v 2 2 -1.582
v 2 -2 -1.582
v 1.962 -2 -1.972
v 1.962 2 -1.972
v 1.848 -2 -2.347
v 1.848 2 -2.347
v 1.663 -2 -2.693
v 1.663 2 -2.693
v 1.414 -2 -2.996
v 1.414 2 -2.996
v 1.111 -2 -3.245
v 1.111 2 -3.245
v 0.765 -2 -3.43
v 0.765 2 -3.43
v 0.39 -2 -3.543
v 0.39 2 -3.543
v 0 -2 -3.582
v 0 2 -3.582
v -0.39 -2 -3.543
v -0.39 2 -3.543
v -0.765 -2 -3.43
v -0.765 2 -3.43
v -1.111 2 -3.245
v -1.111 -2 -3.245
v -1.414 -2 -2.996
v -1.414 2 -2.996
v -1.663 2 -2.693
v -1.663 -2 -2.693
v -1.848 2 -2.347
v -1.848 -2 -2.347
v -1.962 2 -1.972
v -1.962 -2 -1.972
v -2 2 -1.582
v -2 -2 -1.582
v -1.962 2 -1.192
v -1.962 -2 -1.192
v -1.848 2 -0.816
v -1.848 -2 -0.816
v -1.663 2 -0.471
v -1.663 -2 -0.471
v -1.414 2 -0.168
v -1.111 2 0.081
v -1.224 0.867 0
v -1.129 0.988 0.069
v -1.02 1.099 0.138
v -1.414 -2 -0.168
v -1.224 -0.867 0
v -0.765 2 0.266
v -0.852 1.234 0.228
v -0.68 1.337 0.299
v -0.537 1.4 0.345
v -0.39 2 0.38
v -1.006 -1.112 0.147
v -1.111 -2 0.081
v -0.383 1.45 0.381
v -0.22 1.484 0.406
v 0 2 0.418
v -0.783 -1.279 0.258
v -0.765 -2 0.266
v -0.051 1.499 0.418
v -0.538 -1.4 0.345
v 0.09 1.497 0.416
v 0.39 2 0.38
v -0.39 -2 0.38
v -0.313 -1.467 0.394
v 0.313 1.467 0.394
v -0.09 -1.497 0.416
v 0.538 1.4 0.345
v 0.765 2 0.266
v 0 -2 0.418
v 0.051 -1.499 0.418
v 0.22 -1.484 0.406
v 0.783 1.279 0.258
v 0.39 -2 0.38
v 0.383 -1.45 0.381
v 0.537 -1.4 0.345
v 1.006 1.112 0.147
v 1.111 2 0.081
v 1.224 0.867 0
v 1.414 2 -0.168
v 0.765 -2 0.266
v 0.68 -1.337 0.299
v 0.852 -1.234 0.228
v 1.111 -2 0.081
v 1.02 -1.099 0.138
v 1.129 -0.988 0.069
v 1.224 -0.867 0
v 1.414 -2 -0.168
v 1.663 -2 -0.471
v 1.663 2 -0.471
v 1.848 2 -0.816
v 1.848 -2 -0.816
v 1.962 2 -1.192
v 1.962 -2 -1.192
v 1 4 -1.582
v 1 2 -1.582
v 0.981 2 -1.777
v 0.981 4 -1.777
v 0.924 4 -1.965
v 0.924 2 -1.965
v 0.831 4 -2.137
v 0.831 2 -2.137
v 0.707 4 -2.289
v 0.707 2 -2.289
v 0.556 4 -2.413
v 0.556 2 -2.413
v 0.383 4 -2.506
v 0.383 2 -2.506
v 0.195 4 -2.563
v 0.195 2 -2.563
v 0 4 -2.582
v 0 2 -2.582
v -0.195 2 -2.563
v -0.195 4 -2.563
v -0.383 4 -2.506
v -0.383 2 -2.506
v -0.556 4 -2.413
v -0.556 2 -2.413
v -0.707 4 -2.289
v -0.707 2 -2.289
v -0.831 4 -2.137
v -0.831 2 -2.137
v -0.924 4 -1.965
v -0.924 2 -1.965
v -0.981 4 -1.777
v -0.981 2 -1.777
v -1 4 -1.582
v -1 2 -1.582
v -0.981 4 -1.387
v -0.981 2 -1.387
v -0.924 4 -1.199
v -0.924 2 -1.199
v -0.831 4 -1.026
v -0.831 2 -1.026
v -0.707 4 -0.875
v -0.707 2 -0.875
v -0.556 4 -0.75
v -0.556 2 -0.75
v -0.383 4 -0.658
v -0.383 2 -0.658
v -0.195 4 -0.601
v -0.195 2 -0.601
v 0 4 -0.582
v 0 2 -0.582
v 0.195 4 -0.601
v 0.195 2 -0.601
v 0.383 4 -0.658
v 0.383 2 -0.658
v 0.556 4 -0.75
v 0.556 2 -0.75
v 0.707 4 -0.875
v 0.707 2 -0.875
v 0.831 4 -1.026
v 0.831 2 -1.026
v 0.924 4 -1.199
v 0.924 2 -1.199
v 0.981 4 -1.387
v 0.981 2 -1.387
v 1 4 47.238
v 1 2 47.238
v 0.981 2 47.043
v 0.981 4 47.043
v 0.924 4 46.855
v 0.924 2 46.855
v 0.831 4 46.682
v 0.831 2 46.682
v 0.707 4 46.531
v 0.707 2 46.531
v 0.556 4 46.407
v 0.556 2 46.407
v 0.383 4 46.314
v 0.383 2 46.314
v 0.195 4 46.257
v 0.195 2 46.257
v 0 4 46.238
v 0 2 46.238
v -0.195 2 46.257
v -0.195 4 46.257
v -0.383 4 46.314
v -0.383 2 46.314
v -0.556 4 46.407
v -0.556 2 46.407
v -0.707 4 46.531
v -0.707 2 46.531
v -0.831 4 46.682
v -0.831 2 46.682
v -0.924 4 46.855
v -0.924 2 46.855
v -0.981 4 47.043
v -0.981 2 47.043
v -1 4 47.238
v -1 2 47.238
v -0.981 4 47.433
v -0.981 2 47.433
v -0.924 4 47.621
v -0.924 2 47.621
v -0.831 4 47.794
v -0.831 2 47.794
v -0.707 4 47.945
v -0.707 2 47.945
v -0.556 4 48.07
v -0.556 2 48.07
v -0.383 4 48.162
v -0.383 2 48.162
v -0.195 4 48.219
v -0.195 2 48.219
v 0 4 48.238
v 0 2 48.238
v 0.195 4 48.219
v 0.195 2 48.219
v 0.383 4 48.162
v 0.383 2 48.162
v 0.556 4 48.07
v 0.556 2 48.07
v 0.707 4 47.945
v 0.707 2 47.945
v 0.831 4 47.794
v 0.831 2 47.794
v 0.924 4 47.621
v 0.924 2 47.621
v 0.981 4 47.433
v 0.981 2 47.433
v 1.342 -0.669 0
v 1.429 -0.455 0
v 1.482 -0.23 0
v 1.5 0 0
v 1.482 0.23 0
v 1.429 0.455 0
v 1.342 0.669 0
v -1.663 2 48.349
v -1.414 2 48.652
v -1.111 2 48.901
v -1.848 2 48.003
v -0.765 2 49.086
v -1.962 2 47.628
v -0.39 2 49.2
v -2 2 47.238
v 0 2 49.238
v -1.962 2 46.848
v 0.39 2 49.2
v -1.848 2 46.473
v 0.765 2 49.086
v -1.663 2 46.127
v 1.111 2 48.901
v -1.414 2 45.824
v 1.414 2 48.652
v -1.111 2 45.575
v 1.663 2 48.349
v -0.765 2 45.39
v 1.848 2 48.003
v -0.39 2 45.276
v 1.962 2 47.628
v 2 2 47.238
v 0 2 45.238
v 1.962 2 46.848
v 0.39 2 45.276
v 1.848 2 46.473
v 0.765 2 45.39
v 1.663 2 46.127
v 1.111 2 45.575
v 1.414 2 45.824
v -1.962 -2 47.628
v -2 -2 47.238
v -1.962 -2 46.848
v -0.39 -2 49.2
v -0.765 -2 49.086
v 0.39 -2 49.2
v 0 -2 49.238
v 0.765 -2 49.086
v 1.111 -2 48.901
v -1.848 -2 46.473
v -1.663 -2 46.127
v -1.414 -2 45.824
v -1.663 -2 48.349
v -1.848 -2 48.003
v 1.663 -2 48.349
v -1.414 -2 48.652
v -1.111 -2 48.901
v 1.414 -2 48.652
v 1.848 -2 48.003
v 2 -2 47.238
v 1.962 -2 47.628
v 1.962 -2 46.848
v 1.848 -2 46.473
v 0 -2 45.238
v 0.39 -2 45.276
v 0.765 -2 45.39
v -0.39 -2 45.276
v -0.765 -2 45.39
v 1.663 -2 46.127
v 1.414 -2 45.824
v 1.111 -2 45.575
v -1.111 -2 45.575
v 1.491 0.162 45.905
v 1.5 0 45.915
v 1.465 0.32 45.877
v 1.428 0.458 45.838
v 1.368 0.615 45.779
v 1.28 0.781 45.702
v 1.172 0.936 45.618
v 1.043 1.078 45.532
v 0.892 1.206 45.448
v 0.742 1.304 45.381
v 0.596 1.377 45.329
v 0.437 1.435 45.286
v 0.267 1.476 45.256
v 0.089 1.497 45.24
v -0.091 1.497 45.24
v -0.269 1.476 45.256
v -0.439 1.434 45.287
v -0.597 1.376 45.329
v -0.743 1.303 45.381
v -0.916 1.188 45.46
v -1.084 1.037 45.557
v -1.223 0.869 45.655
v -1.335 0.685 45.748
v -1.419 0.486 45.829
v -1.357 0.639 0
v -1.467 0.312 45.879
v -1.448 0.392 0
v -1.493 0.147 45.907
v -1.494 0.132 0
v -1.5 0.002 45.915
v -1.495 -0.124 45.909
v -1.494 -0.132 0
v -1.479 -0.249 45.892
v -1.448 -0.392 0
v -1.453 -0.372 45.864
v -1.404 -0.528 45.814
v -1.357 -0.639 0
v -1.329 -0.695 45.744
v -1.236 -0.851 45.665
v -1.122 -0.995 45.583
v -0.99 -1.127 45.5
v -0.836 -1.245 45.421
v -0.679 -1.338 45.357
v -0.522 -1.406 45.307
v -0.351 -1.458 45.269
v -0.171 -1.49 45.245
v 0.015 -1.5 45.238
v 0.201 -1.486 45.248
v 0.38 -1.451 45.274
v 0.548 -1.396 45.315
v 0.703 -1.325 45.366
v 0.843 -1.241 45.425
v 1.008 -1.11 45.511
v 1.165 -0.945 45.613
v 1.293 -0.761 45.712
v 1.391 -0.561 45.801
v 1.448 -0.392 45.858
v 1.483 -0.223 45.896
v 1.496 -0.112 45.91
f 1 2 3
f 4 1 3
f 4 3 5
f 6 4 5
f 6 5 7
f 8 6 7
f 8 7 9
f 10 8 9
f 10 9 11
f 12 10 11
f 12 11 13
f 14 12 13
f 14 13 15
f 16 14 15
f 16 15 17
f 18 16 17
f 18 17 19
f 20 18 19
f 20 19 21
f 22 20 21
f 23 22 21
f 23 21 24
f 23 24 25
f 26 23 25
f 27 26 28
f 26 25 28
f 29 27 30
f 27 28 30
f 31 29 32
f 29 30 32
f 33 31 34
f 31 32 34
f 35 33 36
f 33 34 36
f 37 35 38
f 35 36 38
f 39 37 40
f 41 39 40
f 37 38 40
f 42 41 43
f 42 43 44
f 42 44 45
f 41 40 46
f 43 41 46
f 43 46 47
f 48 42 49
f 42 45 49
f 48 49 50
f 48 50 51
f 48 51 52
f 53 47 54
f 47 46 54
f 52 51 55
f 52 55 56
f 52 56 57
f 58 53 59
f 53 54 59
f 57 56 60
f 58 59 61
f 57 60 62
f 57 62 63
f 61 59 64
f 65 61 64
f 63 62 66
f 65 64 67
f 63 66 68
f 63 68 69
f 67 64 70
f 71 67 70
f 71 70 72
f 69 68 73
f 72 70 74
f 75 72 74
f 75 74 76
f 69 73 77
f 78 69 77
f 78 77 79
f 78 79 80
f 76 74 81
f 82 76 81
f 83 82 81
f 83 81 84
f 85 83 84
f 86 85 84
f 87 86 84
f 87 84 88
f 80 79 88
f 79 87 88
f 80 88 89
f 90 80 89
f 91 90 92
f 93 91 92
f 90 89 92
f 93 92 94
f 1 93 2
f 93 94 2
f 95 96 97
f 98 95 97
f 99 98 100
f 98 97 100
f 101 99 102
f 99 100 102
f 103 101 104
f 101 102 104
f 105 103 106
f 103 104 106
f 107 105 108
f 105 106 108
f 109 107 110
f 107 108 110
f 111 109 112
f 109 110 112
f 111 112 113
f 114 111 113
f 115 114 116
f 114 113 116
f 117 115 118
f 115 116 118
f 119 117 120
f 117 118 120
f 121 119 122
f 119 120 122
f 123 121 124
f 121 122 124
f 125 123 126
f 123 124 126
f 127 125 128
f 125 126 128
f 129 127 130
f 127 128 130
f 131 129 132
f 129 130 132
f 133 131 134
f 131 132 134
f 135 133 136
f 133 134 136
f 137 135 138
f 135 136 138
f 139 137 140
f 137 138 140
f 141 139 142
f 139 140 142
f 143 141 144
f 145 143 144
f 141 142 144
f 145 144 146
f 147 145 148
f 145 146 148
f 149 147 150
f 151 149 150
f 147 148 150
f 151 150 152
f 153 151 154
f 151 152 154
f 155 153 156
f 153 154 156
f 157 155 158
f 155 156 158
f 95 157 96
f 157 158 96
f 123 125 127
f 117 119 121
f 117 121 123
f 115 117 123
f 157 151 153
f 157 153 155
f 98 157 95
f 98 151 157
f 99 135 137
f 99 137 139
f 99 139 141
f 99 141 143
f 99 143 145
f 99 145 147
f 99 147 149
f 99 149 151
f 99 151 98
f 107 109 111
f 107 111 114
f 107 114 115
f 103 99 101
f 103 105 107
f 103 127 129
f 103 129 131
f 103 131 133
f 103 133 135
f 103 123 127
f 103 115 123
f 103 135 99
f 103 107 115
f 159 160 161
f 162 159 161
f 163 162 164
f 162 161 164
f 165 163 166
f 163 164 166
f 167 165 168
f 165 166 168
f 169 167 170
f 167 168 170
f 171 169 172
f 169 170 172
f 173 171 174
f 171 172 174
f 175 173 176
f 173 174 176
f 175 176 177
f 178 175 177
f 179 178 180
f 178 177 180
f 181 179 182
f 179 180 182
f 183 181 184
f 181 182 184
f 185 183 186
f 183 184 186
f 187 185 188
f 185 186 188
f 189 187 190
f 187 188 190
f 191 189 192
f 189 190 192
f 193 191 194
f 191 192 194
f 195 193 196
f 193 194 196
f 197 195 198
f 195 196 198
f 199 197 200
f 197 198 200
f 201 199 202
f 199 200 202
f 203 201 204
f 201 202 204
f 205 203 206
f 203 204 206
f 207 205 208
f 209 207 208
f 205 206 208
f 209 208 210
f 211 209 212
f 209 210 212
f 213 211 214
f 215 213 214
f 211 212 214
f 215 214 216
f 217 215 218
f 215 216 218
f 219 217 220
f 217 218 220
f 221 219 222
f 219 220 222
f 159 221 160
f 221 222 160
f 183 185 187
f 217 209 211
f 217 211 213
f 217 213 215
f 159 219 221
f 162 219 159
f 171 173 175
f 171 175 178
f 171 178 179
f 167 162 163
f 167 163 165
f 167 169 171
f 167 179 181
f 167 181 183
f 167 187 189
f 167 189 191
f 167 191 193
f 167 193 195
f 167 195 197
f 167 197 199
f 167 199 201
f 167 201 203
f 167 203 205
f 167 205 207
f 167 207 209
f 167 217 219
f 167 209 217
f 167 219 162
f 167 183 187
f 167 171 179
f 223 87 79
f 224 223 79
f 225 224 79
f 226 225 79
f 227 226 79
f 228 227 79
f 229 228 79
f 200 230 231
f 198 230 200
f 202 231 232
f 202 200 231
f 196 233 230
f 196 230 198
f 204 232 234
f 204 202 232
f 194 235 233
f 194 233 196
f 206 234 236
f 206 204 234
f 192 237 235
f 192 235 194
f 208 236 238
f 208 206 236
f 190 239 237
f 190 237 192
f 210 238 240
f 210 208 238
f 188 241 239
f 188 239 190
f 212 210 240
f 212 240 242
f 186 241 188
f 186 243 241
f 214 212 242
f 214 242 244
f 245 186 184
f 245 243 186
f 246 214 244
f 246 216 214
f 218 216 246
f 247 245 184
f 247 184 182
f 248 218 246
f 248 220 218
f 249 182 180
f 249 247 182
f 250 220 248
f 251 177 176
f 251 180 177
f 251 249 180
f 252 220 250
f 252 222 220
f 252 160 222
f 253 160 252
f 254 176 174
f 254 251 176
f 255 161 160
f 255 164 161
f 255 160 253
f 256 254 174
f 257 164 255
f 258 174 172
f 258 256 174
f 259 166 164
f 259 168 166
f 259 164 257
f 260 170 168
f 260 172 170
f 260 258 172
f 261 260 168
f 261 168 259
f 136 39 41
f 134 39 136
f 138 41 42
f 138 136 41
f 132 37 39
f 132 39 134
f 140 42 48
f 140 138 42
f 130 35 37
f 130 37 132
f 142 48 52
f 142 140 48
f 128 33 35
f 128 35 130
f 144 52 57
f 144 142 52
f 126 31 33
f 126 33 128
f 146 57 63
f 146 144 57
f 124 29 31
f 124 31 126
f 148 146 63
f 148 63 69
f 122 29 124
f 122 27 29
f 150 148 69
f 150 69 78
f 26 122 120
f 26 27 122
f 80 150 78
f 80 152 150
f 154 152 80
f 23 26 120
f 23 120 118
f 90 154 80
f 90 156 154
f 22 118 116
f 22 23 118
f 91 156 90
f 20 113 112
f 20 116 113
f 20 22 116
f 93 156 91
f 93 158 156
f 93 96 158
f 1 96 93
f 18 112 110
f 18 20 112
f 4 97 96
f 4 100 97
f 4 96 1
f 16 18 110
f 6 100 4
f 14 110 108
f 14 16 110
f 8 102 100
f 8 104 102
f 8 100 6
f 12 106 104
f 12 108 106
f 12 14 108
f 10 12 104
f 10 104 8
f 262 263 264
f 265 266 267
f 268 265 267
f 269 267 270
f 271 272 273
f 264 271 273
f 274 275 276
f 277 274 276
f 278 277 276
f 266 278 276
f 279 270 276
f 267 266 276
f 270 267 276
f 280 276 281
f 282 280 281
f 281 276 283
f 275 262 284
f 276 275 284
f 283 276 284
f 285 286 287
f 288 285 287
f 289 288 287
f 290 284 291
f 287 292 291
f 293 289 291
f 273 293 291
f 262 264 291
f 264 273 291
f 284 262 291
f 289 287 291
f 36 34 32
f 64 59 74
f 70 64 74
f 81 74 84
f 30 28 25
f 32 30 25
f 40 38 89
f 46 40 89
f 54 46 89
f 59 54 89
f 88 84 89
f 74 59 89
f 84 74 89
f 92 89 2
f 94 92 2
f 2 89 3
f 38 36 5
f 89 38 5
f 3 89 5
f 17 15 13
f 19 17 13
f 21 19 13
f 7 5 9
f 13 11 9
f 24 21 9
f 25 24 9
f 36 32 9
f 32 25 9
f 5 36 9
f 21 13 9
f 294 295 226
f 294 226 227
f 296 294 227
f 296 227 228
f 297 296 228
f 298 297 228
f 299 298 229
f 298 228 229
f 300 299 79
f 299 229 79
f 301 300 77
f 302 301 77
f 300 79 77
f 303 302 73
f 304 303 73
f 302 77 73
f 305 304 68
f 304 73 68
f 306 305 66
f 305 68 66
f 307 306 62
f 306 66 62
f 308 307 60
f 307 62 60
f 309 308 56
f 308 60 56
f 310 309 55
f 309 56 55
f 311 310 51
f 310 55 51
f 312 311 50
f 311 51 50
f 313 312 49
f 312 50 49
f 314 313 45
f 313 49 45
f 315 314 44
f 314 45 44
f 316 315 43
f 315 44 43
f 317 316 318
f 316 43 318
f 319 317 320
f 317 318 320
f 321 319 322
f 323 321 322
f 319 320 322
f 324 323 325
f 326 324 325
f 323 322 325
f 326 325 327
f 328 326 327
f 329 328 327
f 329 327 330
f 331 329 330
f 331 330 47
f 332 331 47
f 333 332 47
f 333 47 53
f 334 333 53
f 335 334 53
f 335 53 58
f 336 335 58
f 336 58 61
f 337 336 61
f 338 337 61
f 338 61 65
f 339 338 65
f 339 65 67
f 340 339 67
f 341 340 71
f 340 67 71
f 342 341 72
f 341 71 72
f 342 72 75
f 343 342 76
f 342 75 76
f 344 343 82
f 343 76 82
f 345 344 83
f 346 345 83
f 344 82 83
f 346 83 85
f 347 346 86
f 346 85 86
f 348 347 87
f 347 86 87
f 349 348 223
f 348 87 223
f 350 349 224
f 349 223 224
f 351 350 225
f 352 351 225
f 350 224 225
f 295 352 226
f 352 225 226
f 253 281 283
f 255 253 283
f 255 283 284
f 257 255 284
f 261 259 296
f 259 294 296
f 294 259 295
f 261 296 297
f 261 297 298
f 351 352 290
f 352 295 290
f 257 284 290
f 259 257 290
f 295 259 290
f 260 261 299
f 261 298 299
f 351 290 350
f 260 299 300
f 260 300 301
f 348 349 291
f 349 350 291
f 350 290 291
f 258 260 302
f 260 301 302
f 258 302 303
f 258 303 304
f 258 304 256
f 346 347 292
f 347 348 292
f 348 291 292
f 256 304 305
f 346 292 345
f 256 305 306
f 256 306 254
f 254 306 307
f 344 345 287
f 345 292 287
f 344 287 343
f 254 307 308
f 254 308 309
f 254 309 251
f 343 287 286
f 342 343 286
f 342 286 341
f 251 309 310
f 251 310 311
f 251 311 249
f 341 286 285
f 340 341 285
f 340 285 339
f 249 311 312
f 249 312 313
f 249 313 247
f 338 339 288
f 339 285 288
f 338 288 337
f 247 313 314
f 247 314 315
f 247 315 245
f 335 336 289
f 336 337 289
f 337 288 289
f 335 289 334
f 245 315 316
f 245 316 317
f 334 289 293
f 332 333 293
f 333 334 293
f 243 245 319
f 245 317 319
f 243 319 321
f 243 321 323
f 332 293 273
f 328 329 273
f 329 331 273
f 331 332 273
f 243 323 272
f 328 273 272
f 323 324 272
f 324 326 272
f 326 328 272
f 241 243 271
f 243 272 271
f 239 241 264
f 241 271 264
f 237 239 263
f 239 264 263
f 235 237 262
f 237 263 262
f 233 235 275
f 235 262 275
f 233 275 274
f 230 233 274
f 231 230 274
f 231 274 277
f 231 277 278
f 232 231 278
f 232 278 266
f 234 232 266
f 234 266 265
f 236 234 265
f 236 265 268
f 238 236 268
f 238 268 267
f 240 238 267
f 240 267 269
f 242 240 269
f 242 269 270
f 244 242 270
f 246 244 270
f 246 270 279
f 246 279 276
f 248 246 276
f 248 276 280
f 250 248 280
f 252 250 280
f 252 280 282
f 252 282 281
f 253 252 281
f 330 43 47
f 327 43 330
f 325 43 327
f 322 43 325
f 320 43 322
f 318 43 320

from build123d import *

# Parameters (mm, degrees)
SKIZZE1_R                       = 1.5
AUFSATZ_LINEAR_AUSTRAGEN1_DEPTH = 46
AUFSATZ_LINEAR_START            = -2
SKIZZE2_R                       = 2
AUFSATZ_LINEAR_AUSTRAGEN2_DEPTH = 4
SKIZZE3_R                       = 1
AUFSATZ_LINEAR_AUSTRAGEN4_DEPTH = 2


with BuildPart() as part:
    # Skizze1 → Aufsatz-Linear austragen1 (new body)
    with BuildSketch(Plane.XY):
        Circle(SKIZZE1_R)
    extrude(amount=AUFSATZ_LINEAR_AUSTRAGEN1_DEPTH)

    # Skizze2 → Aufsatz-Linear austragen2 (add)
    with BuildSketch(Plane(origin=(0, 0, 0), x_dir=(1, 0, 0), z_dir=(0, 1, 0)).offset(AUFSATZ_LINEAR_START)):
        with Locations((0, -47.23803597)):
            Circle(SKIZZE2_R)
        with Locations((0, 1.58182535)):
            Circle(SKIZZE2_R)
    extrude(amount=AUFSATZ_LINEAR_AUSTRAGEN2_DEPTH)

    # Skizze3 → Aufsatz-Linear austragen4 (add)
    with BuildSketch(Plane(origin=(0, 2, 0), x_dir=(1, 0, 0), z_dir=(0, 1, 0))):
        with Locations((0, -47.23803597)):
            Circle(SKIZZE3_R)
        with Locations((0, 1.58182535)):
            Circle(SKIZZE3_R)
    extrude(amount=AUFSATZ_LINEAR_AUSTRAGEN4_DEPTH)


solid = part.part
